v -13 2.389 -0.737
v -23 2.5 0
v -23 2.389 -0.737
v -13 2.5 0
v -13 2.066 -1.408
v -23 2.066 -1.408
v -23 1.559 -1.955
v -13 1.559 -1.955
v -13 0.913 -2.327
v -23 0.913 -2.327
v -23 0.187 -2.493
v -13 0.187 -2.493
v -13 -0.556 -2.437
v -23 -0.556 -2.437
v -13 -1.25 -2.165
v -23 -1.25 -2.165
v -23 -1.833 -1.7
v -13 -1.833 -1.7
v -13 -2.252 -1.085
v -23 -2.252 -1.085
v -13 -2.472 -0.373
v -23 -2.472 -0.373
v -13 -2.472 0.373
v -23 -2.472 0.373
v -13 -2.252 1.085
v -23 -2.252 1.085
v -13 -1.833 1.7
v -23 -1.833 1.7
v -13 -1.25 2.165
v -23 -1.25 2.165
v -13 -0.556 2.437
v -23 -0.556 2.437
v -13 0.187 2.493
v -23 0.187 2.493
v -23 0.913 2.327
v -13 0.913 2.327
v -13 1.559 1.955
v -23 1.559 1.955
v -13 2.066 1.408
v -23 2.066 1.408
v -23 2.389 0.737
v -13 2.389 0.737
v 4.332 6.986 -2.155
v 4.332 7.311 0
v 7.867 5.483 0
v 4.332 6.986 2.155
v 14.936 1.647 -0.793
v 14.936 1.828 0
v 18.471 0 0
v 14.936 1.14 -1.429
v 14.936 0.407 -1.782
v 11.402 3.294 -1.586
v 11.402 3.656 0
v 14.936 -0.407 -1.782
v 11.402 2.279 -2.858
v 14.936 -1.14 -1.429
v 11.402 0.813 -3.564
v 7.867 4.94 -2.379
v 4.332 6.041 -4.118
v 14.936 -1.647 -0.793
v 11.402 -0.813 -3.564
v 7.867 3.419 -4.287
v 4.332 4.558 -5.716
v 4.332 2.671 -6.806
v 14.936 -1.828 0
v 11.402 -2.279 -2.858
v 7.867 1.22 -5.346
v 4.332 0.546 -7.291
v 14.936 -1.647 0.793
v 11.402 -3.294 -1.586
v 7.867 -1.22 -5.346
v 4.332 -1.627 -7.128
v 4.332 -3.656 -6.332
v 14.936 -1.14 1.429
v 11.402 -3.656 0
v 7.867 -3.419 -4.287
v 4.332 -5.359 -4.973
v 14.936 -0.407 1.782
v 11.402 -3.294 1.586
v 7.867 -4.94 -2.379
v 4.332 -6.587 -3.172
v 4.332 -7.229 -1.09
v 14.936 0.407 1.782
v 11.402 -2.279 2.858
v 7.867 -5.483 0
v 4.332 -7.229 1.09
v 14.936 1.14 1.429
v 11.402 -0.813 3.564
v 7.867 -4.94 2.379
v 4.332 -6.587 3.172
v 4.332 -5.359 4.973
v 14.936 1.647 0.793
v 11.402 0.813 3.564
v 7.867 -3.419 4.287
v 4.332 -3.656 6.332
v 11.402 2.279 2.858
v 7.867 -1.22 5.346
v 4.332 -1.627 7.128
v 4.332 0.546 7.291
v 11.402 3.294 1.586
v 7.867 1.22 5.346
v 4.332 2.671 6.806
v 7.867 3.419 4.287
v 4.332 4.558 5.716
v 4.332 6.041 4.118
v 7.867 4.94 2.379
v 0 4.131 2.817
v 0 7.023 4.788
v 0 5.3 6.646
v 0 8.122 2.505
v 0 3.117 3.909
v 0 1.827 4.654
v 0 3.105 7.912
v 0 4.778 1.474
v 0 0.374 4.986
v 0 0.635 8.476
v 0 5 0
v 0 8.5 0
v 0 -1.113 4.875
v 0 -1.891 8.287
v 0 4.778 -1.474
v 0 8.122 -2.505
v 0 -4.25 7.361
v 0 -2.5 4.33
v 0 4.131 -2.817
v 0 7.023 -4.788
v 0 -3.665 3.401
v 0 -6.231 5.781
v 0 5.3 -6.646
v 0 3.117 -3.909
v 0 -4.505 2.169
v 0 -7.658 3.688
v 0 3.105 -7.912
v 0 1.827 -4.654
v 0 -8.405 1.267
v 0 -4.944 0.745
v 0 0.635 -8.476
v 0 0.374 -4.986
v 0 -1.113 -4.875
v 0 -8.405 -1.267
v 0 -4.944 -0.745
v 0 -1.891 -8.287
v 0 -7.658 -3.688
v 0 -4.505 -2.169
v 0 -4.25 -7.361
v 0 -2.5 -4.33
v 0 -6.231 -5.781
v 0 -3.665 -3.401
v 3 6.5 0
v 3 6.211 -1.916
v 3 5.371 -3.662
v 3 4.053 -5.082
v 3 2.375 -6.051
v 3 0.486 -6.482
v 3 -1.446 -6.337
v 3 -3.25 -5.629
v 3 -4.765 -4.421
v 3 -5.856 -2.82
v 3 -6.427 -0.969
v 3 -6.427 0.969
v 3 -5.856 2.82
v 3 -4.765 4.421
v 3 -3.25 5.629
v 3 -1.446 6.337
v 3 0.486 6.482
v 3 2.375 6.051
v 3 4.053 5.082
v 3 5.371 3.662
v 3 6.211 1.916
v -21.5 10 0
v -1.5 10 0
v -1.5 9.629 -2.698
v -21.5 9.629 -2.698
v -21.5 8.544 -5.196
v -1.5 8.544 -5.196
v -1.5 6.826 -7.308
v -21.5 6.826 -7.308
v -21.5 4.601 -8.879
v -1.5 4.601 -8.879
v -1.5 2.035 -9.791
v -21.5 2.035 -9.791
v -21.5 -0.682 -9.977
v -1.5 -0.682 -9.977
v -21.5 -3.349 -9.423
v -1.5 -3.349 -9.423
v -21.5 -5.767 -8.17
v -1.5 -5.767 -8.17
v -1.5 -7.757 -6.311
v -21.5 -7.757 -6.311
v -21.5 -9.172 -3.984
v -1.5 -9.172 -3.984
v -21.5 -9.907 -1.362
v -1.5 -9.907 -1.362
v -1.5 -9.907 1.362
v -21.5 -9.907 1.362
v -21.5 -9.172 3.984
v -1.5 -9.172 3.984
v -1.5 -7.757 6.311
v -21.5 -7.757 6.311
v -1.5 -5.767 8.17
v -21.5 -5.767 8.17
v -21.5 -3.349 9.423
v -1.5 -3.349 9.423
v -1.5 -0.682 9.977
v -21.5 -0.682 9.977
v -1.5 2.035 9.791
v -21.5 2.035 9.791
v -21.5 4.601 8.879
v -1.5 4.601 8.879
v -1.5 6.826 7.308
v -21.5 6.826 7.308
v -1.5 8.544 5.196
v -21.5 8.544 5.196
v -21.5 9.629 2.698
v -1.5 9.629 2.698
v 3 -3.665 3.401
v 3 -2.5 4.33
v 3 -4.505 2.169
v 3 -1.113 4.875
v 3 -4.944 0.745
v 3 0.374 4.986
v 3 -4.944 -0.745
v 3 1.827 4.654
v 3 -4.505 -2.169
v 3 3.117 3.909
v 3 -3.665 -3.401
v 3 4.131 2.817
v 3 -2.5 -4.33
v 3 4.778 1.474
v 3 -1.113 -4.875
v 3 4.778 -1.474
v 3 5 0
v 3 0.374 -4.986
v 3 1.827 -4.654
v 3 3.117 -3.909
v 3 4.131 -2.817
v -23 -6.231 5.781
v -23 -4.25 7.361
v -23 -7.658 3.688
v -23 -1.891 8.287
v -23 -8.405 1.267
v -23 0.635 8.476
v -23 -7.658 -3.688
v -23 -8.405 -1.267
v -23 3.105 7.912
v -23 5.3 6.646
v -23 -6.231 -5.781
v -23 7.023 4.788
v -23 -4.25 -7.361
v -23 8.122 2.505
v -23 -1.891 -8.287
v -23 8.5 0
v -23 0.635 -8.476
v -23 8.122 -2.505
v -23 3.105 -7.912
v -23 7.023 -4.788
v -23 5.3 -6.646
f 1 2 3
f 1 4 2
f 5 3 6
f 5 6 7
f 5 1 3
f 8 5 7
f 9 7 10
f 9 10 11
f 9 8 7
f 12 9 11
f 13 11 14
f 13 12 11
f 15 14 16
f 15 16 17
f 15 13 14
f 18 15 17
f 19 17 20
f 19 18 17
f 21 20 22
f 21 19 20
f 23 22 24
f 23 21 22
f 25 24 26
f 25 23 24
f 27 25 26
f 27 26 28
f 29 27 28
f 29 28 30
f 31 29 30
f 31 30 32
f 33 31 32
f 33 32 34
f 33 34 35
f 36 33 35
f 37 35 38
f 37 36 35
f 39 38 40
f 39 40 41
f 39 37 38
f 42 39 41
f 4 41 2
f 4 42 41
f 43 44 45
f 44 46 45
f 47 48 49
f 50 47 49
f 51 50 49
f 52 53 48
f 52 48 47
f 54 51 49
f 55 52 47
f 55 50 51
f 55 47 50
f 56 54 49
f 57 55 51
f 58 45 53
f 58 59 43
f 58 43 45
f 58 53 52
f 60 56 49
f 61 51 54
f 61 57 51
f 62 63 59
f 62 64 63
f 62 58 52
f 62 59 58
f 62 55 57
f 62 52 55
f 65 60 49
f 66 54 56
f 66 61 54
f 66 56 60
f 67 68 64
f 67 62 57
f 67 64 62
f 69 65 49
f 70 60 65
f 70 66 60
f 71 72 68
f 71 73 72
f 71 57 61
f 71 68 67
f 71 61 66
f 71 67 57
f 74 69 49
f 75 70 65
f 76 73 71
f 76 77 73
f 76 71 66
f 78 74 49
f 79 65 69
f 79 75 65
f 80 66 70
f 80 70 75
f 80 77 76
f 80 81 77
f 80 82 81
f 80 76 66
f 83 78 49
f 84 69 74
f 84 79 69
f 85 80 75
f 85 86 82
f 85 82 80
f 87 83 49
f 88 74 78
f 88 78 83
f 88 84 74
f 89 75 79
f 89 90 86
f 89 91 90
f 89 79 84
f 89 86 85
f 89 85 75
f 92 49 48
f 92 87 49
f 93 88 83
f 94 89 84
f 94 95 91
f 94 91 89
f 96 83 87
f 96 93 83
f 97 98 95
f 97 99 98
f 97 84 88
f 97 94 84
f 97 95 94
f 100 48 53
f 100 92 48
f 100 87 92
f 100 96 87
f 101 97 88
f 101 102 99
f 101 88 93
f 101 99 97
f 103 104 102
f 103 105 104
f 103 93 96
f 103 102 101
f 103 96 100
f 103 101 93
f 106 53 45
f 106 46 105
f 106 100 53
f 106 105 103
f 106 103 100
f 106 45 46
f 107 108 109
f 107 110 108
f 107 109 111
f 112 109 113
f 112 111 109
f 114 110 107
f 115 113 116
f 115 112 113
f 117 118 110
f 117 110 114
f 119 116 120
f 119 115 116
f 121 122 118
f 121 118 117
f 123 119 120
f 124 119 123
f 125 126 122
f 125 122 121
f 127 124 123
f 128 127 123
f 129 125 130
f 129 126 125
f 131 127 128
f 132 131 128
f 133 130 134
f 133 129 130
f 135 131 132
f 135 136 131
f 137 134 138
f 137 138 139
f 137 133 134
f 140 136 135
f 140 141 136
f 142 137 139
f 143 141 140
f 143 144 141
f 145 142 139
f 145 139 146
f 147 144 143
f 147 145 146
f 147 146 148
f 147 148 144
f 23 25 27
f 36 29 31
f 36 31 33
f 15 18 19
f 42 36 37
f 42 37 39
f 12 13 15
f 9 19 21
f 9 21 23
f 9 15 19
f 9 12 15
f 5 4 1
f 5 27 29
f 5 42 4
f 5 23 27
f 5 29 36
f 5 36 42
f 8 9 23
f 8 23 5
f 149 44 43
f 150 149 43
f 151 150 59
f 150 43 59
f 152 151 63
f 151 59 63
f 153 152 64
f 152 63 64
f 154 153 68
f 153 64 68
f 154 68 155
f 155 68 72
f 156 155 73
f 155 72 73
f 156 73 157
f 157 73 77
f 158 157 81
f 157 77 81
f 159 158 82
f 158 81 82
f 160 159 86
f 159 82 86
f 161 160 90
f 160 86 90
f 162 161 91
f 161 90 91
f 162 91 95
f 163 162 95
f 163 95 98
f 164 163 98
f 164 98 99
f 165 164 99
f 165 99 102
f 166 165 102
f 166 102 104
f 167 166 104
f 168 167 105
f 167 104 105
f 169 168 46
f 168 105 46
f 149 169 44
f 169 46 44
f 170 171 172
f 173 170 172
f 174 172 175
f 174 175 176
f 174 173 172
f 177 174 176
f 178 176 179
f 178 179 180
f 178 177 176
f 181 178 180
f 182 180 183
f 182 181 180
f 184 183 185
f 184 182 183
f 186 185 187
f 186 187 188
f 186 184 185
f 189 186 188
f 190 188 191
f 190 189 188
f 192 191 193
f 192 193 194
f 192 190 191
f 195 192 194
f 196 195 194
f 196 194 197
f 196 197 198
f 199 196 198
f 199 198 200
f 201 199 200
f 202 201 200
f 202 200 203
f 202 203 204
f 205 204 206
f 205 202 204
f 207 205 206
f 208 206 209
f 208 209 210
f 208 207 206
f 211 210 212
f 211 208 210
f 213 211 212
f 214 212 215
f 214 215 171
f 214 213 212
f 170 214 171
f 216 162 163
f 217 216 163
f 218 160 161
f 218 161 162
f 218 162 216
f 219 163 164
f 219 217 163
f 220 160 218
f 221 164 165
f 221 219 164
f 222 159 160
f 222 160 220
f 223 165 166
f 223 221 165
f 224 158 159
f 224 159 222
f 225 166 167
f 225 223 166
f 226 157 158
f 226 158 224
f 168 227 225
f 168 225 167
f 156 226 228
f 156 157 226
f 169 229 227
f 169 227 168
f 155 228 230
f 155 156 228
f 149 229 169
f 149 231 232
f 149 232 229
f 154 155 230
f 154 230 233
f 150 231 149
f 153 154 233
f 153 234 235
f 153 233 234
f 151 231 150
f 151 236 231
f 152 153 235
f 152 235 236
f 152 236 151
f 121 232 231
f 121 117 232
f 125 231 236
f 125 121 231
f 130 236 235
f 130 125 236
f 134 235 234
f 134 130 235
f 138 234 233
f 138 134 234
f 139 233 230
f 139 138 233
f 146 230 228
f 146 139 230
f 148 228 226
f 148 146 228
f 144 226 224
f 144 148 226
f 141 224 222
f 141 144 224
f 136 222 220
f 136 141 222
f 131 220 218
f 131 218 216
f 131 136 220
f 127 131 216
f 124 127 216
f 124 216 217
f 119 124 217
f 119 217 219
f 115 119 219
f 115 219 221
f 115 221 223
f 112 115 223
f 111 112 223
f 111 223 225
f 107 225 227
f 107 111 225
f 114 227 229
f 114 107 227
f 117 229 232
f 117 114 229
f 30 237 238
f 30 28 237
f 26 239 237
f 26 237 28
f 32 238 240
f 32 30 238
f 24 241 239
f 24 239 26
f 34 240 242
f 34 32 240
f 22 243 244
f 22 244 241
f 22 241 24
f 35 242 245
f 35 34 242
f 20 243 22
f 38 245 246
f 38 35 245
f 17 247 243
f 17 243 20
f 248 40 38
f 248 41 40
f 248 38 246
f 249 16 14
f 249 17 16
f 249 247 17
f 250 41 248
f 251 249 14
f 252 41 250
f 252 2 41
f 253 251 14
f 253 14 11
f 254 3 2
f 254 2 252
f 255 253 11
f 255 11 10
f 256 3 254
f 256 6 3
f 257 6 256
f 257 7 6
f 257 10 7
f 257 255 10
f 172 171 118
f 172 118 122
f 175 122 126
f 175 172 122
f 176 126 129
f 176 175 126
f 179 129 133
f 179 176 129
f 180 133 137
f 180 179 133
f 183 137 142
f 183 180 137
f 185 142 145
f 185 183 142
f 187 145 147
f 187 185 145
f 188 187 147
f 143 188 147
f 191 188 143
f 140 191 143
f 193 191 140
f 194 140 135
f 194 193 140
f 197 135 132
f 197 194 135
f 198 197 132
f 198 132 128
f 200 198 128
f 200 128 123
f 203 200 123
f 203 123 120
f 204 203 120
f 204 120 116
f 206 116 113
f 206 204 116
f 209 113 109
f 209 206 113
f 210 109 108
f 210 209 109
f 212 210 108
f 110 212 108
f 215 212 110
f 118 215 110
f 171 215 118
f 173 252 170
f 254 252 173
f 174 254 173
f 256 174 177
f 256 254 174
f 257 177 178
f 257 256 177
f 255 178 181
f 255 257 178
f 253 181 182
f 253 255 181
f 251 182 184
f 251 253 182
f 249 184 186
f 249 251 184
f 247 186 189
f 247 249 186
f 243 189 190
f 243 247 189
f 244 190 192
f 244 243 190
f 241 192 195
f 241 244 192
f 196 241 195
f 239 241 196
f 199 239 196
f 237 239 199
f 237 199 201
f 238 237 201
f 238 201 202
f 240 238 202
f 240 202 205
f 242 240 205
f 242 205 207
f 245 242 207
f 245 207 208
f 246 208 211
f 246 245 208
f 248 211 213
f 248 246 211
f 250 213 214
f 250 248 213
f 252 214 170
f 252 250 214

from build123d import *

# Parameters (mm, degrees)
F2_SIZE = 1.5
F3_SIZE = 1.5


with BuildPart() as f1:
    # F0 (on Top) → F1 (revolve)
    with BuildSketch(Plane.XY):
        Polygon((3, 5), (0, 5), (0, 10), (-23, 10), (-23, 2.5), (-22, 2.5), (-13, 2.5), (-13, 0), (0, 0), (18.471096, 0), (3, 8), align=None)
    revolve(axis=Axis((9.235548, 0, 0), (-1, 0, 0)))

    # F2
    f2_edges = [f1.edges().sort_by_distance(p)[0] for p in [
        (0, -10, 0),
        (-23, -10, 0),
        (-11.5, 10, 0),
    ]]
    chamfer(f2_edges, length=F2_SIZE)

    # F3
    f3_edges = [f1.edges().sort_by_distance(p)[0] for p in [
        (3, -8, 0),
    ]]
    chamfer(f3_edges, length=F3_SIZE)


solid = f1.part
